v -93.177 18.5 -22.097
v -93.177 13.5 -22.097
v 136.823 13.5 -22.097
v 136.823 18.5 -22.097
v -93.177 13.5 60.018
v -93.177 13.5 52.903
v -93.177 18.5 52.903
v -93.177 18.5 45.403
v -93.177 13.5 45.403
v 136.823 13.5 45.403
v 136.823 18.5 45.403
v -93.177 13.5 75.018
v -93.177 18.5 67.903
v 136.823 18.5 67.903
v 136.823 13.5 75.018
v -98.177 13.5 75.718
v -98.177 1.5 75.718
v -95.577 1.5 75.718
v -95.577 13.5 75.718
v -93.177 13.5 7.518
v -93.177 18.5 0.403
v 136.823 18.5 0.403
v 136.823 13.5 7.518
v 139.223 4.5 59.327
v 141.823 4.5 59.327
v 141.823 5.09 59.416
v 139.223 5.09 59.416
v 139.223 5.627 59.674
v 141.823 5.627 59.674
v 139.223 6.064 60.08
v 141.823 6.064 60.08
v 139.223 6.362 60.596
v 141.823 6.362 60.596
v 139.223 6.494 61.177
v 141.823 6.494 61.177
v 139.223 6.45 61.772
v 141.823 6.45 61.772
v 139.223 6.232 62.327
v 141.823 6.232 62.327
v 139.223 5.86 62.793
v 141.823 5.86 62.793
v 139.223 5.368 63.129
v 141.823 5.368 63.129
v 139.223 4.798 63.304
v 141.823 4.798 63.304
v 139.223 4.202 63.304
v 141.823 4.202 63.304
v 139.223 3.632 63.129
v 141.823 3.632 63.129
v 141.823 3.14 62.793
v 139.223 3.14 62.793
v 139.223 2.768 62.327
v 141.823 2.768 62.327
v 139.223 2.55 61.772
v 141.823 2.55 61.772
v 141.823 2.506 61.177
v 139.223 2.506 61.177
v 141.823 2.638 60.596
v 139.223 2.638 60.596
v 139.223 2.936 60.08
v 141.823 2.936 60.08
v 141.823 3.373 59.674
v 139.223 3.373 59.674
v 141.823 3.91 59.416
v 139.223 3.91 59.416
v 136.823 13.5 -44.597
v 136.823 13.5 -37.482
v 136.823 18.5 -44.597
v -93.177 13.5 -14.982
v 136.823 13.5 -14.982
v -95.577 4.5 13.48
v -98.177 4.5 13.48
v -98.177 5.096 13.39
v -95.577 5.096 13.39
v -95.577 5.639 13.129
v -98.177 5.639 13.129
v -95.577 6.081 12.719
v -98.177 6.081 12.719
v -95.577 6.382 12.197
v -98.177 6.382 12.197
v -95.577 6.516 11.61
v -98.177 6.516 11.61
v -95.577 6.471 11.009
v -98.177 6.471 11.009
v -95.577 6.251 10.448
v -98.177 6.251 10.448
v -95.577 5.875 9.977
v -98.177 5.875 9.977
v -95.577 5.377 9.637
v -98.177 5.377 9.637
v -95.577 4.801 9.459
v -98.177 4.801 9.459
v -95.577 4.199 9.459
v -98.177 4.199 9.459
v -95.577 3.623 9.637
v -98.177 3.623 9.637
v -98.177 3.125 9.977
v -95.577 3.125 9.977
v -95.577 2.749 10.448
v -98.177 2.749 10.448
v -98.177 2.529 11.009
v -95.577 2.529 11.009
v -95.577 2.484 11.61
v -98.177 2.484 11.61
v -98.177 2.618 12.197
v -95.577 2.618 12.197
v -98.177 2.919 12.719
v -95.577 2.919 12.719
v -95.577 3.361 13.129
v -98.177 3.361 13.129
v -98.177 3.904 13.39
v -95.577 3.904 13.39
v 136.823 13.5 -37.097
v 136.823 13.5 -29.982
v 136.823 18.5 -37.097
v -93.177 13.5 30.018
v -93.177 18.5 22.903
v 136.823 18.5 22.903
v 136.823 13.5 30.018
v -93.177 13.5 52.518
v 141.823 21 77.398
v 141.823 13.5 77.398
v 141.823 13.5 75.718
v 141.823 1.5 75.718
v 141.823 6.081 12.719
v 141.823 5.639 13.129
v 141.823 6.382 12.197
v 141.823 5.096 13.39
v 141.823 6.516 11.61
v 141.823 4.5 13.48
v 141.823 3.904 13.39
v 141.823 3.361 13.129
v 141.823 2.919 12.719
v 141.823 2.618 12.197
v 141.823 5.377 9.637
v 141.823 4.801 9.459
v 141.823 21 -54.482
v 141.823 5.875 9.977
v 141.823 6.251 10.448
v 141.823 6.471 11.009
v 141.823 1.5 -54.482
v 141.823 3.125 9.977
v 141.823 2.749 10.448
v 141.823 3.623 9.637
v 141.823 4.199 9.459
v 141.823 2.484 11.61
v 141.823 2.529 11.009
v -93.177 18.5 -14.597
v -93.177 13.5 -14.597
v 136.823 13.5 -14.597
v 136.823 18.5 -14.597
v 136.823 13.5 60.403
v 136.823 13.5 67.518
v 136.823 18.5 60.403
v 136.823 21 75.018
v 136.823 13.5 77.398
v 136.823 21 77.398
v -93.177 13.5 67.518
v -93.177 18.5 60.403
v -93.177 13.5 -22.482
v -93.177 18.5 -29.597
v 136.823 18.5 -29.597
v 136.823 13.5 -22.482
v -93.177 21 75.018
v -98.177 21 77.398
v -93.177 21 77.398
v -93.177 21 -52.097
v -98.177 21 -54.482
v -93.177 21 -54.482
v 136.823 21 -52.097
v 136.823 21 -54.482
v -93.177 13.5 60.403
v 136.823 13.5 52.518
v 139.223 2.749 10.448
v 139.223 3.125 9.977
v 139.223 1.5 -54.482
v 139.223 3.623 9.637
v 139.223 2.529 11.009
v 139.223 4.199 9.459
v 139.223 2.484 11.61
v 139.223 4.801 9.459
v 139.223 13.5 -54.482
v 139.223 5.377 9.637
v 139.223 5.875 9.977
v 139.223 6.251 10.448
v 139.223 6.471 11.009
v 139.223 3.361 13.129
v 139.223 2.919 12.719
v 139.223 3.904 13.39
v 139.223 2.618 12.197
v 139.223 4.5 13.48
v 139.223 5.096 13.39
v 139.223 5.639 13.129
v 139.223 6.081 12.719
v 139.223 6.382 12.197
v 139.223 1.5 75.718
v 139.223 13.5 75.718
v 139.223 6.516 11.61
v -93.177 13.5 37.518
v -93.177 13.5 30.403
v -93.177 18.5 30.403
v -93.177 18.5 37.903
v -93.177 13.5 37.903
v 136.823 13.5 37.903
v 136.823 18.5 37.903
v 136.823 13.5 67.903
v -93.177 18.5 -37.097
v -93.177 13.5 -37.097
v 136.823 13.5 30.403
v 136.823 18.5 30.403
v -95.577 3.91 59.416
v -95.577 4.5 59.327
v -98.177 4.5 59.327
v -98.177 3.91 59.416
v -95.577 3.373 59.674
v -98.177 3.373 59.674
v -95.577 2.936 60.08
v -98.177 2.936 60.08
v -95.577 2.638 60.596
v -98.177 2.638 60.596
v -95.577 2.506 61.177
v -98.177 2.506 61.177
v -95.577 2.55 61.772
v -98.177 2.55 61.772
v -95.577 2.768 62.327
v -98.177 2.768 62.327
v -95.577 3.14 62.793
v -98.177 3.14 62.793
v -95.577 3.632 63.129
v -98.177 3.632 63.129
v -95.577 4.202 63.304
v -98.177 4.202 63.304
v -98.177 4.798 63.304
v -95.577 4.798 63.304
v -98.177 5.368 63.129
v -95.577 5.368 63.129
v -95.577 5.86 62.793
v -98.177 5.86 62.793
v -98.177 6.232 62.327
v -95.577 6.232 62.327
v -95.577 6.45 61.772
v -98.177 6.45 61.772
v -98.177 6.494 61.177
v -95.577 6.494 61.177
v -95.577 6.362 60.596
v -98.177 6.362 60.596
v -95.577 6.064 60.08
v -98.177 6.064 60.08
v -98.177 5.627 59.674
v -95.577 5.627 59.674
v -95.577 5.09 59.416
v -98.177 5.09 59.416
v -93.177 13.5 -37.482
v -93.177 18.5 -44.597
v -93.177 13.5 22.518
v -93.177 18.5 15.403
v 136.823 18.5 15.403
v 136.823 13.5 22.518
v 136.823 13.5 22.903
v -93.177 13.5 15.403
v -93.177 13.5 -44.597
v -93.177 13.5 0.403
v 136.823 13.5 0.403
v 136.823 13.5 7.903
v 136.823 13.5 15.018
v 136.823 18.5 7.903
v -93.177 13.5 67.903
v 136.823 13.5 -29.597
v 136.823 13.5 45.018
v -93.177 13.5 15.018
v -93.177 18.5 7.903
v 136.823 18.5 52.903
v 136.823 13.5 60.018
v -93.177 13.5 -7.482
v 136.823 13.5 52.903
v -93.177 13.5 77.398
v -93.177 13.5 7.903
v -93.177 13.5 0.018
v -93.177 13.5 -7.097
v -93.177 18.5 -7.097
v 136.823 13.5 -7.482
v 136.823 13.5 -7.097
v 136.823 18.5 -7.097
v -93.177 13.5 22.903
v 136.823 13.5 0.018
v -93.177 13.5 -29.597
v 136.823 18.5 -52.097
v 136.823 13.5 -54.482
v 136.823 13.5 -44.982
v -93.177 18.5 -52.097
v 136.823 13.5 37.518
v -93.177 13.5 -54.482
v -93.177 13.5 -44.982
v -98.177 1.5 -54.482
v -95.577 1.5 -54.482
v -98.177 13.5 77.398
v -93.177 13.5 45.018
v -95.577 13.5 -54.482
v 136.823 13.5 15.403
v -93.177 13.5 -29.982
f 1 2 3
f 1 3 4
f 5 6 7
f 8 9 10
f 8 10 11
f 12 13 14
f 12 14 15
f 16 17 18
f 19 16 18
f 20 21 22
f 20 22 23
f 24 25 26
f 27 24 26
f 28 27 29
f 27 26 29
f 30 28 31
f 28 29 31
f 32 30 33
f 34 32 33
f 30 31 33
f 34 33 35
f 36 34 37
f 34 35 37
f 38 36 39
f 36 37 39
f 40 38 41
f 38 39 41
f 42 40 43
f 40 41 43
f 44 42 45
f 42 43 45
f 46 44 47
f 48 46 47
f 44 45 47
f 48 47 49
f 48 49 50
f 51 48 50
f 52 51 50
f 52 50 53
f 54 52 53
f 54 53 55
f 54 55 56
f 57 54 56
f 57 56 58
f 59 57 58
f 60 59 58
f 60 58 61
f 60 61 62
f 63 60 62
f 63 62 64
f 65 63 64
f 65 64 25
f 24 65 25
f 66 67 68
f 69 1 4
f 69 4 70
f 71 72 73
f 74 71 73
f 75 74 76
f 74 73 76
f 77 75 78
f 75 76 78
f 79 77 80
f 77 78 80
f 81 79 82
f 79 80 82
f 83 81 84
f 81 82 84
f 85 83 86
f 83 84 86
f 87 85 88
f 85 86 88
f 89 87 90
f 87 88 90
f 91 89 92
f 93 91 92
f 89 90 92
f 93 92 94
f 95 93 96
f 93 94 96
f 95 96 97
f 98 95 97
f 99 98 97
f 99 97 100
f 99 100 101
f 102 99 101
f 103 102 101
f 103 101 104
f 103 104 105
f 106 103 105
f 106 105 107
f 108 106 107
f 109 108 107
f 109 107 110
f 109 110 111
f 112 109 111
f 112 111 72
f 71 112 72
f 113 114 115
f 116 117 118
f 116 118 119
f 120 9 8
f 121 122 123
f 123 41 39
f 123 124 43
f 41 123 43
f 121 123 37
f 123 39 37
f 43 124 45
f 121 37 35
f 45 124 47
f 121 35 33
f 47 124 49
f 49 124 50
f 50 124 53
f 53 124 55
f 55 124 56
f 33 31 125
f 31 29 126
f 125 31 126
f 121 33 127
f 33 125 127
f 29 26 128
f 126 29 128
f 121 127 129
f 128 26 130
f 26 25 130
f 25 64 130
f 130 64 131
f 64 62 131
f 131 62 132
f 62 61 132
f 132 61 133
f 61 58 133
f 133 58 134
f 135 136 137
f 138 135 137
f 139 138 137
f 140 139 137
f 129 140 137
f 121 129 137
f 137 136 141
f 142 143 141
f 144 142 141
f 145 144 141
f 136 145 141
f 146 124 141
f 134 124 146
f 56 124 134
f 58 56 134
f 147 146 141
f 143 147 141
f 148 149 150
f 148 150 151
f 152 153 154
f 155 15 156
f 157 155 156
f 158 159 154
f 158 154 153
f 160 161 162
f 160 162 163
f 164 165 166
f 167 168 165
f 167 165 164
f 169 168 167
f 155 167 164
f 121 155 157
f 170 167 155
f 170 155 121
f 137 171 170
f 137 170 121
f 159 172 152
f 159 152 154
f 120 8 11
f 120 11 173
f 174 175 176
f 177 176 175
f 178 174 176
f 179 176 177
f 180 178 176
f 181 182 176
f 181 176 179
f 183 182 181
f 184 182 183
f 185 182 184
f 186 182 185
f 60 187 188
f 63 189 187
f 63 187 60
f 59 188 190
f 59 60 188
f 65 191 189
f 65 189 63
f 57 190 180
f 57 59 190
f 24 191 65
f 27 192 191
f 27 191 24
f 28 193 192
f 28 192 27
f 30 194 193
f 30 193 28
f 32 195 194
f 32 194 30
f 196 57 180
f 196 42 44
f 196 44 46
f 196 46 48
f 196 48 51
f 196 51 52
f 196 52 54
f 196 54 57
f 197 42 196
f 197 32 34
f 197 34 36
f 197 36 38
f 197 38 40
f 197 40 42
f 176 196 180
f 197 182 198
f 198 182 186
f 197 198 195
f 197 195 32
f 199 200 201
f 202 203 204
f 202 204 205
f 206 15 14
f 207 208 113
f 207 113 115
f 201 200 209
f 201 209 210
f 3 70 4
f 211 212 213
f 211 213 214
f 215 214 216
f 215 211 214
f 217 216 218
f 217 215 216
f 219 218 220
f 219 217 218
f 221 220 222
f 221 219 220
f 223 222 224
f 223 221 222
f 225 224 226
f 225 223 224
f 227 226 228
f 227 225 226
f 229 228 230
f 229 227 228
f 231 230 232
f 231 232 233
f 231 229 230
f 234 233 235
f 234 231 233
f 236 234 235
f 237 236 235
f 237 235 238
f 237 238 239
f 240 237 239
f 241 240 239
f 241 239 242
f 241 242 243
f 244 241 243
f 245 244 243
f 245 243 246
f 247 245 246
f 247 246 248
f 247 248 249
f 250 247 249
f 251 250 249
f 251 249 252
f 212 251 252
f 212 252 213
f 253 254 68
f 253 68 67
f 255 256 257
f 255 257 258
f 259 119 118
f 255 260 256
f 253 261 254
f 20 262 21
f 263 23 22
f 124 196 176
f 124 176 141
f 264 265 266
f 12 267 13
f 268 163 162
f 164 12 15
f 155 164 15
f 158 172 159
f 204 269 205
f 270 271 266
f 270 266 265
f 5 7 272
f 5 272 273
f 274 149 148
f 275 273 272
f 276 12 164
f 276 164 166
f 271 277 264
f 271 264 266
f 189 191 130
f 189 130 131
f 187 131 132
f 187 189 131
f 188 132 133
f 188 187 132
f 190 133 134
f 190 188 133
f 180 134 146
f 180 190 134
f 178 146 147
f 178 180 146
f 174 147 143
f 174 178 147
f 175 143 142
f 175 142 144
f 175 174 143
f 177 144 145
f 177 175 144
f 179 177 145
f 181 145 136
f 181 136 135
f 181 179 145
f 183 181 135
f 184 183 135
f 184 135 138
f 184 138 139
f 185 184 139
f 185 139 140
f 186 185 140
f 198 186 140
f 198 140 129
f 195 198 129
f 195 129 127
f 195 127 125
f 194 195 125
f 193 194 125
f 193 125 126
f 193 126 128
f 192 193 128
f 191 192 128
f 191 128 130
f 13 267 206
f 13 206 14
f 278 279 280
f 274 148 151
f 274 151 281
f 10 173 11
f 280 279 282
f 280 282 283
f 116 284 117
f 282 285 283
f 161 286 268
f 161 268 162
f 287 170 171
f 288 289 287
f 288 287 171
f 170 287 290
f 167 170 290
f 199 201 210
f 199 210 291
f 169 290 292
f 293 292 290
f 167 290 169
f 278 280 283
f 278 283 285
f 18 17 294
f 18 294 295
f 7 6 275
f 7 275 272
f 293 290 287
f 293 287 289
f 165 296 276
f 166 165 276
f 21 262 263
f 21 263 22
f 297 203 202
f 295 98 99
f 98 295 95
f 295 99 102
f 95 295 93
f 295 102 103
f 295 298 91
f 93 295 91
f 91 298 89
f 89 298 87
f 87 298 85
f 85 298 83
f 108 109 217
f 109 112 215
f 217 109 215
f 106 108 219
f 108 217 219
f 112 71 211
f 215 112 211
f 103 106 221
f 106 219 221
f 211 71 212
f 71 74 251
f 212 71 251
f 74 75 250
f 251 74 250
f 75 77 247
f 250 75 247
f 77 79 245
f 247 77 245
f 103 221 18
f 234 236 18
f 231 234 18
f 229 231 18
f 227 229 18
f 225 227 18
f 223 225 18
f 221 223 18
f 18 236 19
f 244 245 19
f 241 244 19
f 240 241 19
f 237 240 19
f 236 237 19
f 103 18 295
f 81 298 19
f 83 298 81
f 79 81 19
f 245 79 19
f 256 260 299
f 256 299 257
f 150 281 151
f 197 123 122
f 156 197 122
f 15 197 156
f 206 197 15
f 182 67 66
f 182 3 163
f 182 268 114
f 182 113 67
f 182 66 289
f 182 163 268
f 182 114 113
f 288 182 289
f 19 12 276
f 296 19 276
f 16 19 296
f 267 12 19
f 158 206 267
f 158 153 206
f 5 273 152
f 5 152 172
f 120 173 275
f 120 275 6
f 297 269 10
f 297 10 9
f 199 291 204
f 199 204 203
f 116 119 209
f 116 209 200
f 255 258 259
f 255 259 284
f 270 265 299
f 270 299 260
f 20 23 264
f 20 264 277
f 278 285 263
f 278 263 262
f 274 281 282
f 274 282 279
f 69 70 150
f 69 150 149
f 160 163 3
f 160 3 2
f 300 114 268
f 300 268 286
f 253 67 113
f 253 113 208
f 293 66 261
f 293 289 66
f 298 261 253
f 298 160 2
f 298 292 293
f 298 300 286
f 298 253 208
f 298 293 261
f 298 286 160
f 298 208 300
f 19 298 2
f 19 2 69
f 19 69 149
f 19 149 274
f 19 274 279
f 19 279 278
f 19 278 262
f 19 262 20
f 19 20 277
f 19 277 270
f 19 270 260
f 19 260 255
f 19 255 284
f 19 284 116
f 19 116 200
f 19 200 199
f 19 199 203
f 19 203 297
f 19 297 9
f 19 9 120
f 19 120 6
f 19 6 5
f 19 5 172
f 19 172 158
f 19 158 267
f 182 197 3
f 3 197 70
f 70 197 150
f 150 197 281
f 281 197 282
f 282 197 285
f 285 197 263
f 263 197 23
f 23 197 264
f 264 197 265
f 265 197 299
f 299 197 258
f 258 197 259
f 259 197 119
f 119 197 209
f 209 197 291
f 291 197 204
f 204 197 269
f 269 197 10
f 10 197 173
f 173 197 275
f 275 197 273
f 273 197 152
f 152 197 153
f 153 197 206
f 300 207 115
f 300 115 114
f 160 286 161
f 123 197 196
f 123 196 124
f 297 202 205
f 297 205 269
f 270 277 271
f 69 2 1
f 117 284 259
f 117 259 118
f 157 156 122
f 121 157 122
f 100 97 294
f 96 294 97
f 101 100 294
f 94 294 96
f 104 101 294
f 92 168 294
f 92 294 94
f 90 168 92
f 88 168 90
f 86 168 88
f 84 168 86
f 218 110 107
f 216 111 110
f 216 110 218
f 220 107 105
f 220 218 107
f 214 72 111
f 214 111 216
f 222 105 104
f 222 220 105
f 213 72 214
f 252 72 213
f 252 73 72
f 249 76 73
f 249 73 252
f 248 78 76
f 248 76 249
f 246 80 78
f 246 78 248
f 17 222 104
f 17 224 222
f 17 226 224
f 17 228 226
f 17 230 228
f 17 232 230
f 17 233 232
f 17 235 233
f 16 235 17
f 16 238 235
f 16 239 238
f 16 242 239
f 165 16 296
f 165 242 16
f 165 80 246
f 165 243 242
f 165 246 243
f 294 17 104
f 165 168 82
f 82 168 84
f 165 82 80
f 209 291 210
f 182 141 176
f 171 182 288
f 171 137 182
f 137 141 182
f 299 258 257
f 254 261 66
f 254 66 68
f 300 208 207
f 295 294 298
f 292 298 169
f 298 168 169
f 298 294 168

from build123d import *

# Parameters (mm, degrees)
SKETCH1_W           = 240
SKETCH1_H           = 351.15
BOSS_EXTRUDE3_DEPTH = 21
SKETCH5_W           = 248.975913499
SKETCH5_H           = 113.170869772
CUT_EXTRUDE5_DEPTH  = 254
CAVITY1_START       = -93.176553254
CAVITY1_DEPTH       = 230
SKETCH6_W           = 230
SKETCH6_H           = 2.384694545
CUT_EXTRUDE6_DEPTH  = 10
SKETCH7_W           = 329.692379319
SKETCH7_H           = 158.801284786
CUT_EXTRUDE10_DEPTH = 41
SKETCH11_W          = 230
SKETCH11_H          = 3.476591165
CUT_EXTRUDE14_DEPTH = 10
SKETCH9_W           = 2.6
SKETCH9_H           = 130.2
BOSS_EXTRUDE4_DEPTH = 12
SKETCH14_R          = 2.021585834
CUT_EXTRUDE15_DEPTH = 10
CUT_EXTRUDE16_START = -10
SKETCH13_R          = 2.021585834
CUT_EXTRUDE16_DEPTH = 10
SKETCH16_R          = 2
CUT_EXTRUDE17_DEPTH = 10
CUT_EXTRUDE18_START = -10
SKETCH15_R          = 2
CUT_EXTRUDE18_DEPTH = 10


with BuildPart() as part:
    # Sketch1 → Boss-Extrude3 (new body)
    with BuildSketch(Plane(origin=(0, 0, 0), x_dir=(1, 0, 0), z_dir=(0, 1, 0))):
        with Locations((21.823446746, 98.176553254)):
            Rectangle(SKETCH1_W, SKETCH1_H)
    extrude(amount=BOSS_EXTRUDE3_DEPTH)

    # Sketch5 → Cut-Extrude5 (cut)
    with BuildSketch(Plane(origin=(0, 0, -54.481553254), x_dir=(-1, 0, 0), z_dir=(0, 0, -1))):
        with Locations((-20.8478358, 4.110963623)):
            Rectangle(SKETCH5_W, SKETCH5_H)
    extrude(amount=CUT_EXTRUDE5_DEPTH, mode=Mode.SUBTRACT)

    # Cavity1: read off the stored shape, not the designer's step
    # Cavity1 outline → Cavity1 (cut)
    with BuildSketch(Plane.YZ.offset(CAVITY1_START)):
        Polygon((18.5, 60.403141291), (13.5, 67.518446746), (13.5, 67.903141291), (18.5, 67.903141291), (13.5, 75.018446746), (5, 75.018446746), (5, -54.481553254), (13.5, -54.481553254), (13.5, -52.096858709), (18.5, -52.096858709), (13.5, -44.981553254), (13.5, -44.596858709), (18.5, -44.596858709), (13.5, -37.481553254), (13.5, -37.096858709), (18.5, -37.096858709), (13.5, -29.981553254), (13.5, -29.596858709), (18.5, -29.596858709), (13.5, -22.481553254), (13.5, -22.096858709), (18.5, -22.096858709), (13.5, -14.981553254), (13.5, -14.596858709), (18.5, -14.596858709), (13.5, -7.481553254), (13.5, -7.096858709), (18.5, -7.096858709), (13.5, 0.018446746), (13.5, 0.403141291), (18.5, 0.403141291), (13.5, 7.518446746), (13.5, 7.903141291), (18.5, 7.903141291), (13.5, 15.018446746), (13.5, 15.403141291), (18.5, 15.403141291), (13.5, 22.518446746), (13.5, 22.903141291), (18.5, 22.903141291), (13.5, 30.018446746), (13.5, 30.403141291), (18.5, 30.403141291), (13.5, 37.518446746), (13.5, 37.903141291), (18.5, 37.903141291), (13.5, 45.018446746), (13.5, 45.403141291), (18.5, 45.403141291), (13.5, 52.518446746), (13.5, 52.903141291), (18.5, 52.903141291), (13.5, 60.018446746), (13.5, 60.403141291), align=None)
    extrude(amount=CAVITY1_DEPTH, mode=Mode.SUBTRACT)

    # Sketch6 → Cut-Extrude6 (cut)
    with BuildSketch(Plane(origin=(0, 13.5, 0), x_dir=(-1, 0, 0), z_dir=(0, -1, 0))):
        with Locations((-21.823446746, 53.289205982)):
            Rectangle(SKETCH6_W, SKETCH6_H)
    extrude(amount=-CUT_EXTRUDE6_DEPTH, mode=Mode.SUBTRACT)

    # Sketch7 → Cut-Extrude10 (cut)
    with BuildSketch(Plane(origin=(0, 13.5, 0), x_dir=(-1, 0, 0), z_dir=(0, -1, 0))):
        with Locations((-33.84938791, -12.885366014)):
            Rectangle(SKETCH7_W, SKETCH7_H)
    extrude(amount=CUT_EXTRUDE10_DEPTH, mode=Mode.SUBTRACT)

    # Sketch11 → Cut-Extrude14 (cut)
    with BuildSketch(Plane.XZ.offset(-13.5)):
        with Locations((21.823446746, 76.756742329)):
            Rectangle(SKETCH11_W, SKETCH11_H)
    extrude(amount=-CUT_EXTRUDE14_DEPTH, mode=Mode.SUBTRACT)

    # Sketch9 → Boss-Extrude4 (add)
    with BuildSketch(Plane.XZ.offset(-13.5)):
        with Locations((-96.876553254, 10.618446746)):
            Rectangle(SKETCH9_W, SKETCH9_H)
        with Locations((140.523446746, 10.618446746)):
            Rectangle(SKETCH9_W, SKETCH9_H)
    extrude(amount=BOSS_EXTRUDE4_DEPTH)

    # Sketch14 → Cut-Extrude15 (cut)
    with BuildSketch(Plane.ZY.offset(98.176553254)):
        with Locations((11.458446746, 4.5)):
            Circle(SKETCH14_R)
    extrude(amount=-CUT_EXTRUDE15_DEPTH, mode=Mode.SUBTRACT)

    # Sketch13 → Cut-Extrude16 (cut)
    with BuildSketch(Plane(origin=(141.823446746, 0, 0), x_dir=(0, 0, -1), z_dir=(1, 0, 0)).offset(CUT_EXTRUDE16_START)):
        with Locations(Location((-11.458446746, 4.5, 0), (0, 0, 180))):
            Circle(SKETCH13_R)
    extrude(amount=CUT_EXTRUDE16_DEPTH, mode=Mode.SUBTRACT)

    # Sketch16 → Cut-Extrude17 (cut)
    with BuildSketch(Plane(origin=(141.823446746, 0, 0), x_dir=(0, 0, -1), z_dir=(1, 0, 0))):
        with Locations((-61.32678821, 4.5)):
            Circle(SKETCH16_R)
    extrude(amount=-CUT_EXTRUDE17_DEPTH, mode=Mode.SUBTRACT)

    # Sketch15 → Cut-Extrude18 (cut)
    with BuildSketch(Plane.ZY.offset(98.176553254).offset(CUT_EXTRUDE18_START)):
        with Locations(Location((61.32678821, 4.5, 0), (0, 0, 180))):
            Circle(SKETCH15_R)
    extrude(amount=CUT_EXTRUDE18_DEPTH, mode=Mode.SUBTRACT)


solid = part.part
